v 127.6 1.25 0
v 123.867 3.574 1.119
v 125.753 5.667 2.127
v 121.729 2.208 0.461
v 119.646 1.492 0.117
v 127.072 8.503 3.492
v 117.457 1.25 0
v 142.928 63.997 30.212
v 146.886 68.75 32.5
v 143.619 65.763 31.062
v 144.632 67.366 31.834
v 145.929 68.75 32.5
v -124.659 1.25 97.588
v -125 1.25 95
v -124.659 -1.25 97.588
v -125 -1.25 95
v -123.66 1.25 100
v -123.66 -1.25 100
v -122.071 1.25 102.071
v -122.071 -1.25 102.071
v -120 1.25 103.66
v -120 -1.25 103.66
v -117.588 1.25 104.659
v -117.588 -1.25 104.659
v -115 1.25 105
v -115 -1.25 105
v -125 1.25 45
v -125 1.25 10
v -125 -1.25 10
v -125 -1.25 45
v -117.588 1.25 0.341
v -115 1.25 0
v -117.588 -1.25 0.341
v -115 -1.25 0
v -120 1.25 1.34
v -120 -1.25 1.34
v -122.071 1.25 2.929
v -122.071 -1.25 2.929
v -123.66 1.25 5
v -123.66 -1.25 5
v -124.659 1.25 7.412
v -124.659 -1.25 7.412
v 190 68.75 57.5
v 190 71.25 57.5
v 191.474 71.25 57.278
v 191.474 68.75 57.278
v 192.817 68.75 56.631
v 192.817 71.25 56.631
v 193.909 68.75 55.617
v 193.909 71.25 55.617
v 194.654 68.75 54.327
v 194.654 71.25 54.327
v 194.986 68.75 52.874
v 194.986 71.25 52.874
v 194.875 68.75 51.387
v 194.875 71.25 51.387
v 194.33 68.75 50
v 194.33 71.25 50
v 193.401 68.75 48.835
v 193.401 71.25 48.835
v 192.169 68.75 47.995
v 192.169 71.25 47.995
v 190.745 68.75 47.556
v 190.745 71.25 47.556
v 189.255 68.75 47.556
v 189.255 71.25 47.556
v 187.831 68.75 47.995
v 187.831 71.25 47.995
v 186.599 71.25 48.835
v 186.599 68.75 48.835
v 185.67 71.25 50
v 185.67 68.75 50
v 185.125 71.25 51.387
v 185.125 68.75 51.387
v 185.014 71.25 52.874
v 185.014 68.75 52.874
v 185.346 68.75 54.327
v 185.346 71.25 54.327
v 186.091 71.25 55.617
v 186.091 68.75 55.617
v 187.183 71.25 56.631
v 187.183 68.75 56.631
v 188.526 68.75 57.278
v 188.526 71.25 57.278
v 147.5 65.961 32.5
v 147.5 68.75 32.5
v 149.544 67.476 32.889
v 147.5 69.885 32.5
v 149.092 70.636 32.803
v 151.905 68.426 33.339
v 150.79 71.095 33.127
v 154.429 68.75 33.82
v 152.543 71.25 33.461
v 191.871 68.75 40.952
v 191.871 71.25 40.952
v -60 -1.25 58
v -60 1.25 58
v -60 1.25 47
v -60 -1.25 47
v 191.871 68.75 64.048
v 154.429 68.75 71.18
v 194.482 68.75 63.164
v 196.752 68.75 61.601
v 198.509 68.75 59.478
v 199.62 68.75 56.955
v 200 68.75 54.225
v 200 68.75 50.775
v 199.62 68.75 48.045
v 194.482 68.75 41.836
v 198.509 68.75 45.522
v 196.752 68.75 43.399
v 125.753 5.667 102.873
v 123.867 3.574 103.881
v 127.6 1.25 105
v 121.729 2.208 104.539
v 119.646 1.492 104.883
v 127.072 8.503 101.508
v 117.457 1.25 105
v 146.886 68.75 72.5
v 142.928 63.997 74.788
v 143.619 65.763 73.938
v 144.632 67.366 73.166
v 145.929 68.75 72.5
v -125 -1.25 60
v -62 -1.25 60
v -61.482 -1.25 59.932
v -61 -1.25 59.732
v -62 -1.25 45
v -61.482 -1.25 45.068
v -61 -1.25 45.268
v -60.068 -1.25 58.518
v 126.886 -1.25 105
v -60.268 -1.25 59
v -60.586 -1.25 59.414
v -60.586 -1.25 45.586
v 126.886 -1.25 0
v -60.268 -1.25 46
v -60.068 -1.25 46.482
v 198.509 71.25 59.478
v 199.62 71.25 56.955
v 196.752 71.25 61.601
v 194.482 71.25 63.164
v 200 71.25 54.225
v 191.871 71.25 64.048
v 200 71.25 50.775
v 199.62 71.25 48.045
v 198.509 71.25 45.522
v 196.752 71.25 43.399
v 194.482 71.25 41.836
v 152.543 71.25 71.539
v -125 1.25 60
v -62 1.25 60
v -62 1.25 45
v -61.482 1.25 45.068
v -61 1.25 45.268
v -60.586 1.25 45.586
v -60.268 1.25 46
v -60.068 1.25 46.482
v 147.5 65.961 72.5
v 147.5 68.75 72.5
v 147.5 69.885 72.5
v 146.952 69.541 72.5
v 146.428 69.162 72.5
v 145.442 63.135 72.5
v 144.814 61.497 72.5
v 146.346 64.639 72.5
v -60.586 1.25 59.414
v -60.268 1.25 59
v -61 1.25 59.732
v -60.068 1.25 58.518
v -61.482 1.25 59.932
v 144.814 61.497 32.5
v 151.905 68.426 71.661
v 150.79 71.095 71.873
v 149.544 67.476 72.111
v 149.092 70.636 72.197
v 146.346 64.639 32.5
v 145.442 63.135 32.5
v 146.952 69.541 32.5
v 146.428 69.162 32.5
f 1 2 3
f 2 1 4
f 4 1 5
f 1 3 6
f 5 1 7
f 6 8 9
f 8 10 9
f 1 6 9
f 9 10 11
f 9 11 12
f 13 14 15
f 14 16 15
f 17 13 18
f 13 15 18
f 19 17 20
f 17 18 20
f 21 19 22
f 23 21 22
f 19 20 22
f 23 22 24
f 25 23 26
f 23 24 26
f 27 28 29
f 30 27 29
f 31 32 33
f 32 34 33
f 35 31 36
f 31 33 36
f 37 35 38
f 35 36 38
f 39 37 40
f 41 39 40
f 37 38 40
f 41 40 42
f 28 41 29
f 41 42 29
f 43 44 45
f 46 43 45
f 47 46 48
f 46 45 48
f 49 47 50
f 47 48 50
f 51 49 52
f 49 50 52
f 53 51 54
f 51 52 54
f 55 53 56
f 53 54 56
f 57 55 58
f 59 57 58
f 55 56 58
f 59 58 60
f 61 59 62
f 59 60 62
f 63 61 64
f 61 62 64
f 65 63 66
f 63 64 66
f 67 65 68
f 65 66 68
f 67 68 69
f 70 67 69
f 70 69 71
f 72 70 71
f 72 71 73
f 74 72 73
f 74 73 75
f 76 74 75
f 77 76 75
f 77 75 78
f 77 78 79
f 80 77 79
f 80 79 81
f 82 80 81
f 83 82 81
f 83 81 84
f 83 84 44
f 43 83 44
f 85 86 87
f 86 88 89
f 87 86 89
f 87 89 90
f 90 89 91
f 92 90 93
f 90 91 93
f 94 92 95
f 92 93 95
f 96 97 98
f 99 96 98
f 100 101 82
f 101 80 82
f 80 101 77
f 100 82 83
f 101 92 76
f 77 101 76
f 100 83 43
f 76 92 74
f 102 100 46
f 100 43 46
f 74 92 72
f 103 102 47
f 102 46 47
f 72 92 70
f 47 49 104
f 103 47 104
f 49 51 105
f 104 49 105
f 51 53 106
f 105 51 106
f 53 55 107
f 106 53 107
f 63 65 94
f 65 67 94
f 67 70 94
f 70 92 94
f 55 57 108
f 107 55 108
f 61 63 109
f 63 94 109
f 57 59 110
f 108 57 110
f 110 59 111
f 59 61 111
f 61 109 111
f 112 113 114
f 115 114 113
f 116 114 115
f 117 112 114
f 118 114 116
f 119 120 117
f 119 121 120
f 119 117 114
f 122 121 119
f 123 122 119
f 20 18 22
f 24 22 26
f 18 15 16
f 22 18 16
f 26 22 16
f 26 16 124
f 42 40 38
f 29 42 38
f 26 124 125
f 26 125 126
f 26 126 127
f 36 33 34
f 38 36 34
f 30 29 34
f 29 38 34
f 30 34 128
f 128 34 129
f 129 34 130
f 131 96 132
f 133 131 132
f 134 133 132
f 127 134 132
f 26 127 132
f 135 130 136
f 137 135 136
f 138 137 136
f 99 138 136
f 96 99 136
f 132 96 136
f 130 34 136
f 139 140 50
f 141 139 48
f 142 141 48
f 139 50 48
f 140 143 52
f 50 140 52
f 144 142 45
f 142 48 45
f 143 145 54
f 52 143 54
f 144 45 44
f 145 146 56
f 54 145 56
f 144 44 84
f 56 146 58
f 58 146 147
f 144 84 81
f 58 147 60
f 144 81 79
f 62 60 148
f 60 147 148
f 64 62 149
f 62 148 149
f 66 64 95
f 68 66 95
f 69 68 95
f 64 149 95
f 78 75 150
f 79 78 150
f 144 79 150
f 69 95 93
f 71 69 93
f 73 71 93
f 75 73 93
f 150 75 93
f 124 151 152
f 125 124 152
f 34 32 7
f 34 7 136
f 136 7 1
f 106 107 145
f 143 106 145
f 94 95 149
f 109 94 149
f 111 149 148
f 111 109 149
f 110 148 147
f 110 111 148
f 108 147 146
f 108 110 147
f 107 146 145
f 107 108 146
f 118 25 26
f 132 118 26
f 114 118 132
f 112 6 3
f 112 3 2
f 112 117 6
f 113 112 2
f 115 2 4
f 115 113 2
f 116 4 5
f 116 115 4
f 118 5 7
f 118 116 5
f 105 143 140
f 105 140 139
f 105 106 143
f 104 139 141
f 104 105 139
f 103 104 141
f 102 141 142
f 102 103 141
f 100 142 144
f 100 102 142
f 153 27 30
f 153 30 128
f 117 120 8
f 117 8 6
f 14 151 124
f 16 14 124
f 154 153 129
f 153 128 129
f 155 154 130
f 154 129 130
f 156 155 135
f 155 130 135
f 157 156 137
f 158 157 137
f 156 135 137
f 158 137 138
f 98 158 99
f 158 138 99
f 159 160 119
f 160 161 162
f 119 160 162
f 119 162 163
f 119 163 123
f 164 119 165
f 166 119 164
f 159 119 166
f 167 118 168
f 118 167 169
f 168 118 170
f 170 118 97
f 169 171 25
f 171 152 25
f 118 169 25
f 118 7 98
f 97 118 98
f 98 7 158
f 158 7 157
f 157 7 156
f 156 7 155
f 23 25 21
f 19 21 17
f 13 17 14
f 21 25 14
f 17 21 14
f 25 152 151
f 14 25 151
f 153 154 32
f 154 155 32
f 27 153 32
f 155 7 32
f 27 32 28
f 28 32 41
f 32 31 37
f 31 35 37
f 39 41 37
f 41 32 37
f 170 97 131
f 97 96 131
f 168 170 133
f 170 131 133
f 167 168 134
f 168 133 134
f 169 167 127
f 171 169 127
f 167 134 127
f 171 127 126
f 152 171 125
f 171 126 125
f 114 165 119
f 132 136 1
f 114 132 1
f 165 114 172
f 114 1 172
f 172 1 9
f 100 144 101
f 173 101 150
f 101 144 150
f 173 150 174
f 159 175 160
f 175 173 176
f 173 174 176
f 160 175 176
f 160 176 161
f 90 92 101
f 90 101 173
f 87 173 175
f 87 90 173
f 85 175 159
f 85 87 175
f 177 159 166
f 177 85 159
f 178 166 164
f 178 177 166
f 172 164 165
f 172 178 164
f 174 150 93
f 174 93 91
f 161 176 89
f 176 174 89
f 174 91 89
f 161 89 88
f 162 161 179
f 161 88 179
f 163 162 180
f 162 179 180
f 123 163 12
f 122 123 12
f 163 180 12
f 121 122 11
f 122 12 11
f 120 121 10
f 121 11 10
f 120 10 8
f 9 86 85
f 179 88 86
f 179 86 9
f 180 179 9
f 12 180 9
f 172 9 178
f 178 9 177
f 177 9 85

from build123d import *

# Parameters (mm, degrees)
BOSS_EXTRUDE1_DEPTH = 105
CUT_EXTRUDE1_REACH  = 238.485
SKETCH2_W           = 65
SKETCH2_H           = 15
CUT_EXTRUDE12_DEPTH = 281.35970199
CUT_EXTRUDE14_REACH = 239.237
FILLET1_R           = 10
FILLET2_R           = 10
FILLET3_R           = 10
FILLET4_R           = 2
CUT_EXTRUDE15_REACH = 239.237
SKETCH13_R          = 5
FILLET5_R           = 10


with BuildPart() as part:
    # Sketch1 → Boss-Extrude1 (new body)
    with BuildSketch(Plane.XY):
        Polygon((-125, -1.25), (125, -1.25), (126.885753532, -1.25), (146.885753532, 68.75), (200, 68.75), (200, 71.25), (145, 71.25), (125, 1.25), (-125, 1.25), align=None)
    extrude(amount=BOSS_EXTRUDE1_DEPTH)

    # Sketch2 → Cut-Extrude1 (cut, up to next)
    with BuildSketch(Plane(origin=(0, 1.25, 0), x_dir=(1, 0, 0), z_dir=(0, 1, 0)), mode=Mode.PRIVATE) as cut_extrude1_sk1:
        with Locations((-92.5, -52.5)):
            Rectangle(SKETCH2_W, SKETCH2_H)
    cut_extrude1_tool1 = extrude(cut_extrude1_sk1.sketch, amount=-CUT_EXTRUDE1_REACH, mode=Mode.PRIVATE) & part.part
    add(cut_extrude1_tool1.solids().sort_by_distance((-92.5, 1.25, 52.5))[0], mode=Mode.SUBTRACT)

    # Sketch11 → Cut-Extrude12 (cut, through all)
    with BuildSketch(Plane(origin=(125, 0, 0), x_dir=(0, 0, -1), z_dir=(1, 0, 0))):
        Polygon((0, 71.25), (0, 1.25), (-32.5, 68.75), (-32.5, 71.25), align=None)
        Polygon((-72.5, 68.75), (-72.5, 71.25), (-105, 71.25), (-105, 1.25), align=None)
    extrude(amount=CUT_EXTRUDE12_DEPTH, mode=Mode.SUBTRACT)

    # Sketch12 → Cut-Extrude14 (cut, up to next)
    with BuildSketch(Plane(origin=(0, 71.25, 0), x_dir=(1, 0, 0), z_dir=(0, 1, 0)), mode=Mode.PRIVATE) as cut_extrude14_sk1:
        Polygon((200, -62.5), (147.5, -72.5), (200, -72.5), align=None)
    cut_extrude14_tool1 = extrude(cut_extrude14_sk1.sketch, amount=-CUT_EXTRUDE14_REACH, mode=Mode.PRIVATE) & part.part
    # Sketch12 → Cut-Extrude14 (cut, up to next)
    with BuildSketch(Plane(origin=(0, 71.25, 0), x_dir=(1, 0, 0), z_dir=(0, 1, 0)), mode=Mode.PRIVATE) as cut_extrude14_sk2:
        Polygon((200, -32.5), (147.5, -32.5), (200, -42.5), align=None)
    cut_extrude14_tool2 = extrude(cut_extrude14_sk2.sketch, amount=-CUT_EXTRUDE14_REACH, mode=Mode.PRIVATE) & part.part
    add(cut_extrude14_tool1.solids().sort_by_distance((182.5, 71.25, 69.166667))[0], mode=Mode.SUBTRACT)
    add(cut_extrude14_tool2.solids().sort_by_distance((182.5, 71.25, 35.833333))[0], mode=Mode.SUBTRACT)

    # Fillet1
    fillet1_edges = [part.edges().sort_by_distance(p)[0] for p in [
        (200, 70, 42.5),
        (200, 70, 62.5),
    ]]
    fillet(fillet1_edges, radius=FILLET1_R)

    # Fillet2
    # the kernel refuses this fillet: 10 mm, written as the material it adds along each edge
    with BuildSketch(Plane(origin=(146.885753532, 68.75, 32.5), x_dir=(1, 0, 0), z_dir=(0, 0, 1))) as fillet2_piece_1_section:
        with BuildLine():
            CenterArc((FILLET2_R * 0.754301412754, -FILLET2_R), FILLET2_R, 90, 74.054604099)
            Line((-FILLET2_R * 0.207222534886, -FILLET2_R * 0.725278872103), (0, 0))
            Line((0, 0), (FILLET2_R * 0.754301412754, 0))
        make_face()
    fillet2_piece_1 = extrude(amount=40, mode=Mode.PRIVATE)
    fillet2_piece_1 = split(fillet2_piece_1, bisect_by=Plane(origin=(151.701250416, 67.179105295, 33.300238174), z_dir=(-0.18711210788999527, 0, 0.9823385664224747)), keep=Keep.TOP, mode=Mode.PRIVATE)
    fillet2_piece_1 = split(fillet2_piece_1, bisect_by=Plane(origin=(151.701250416, 67.179105295, 71.699761826), z_dir=(-0.18711210788999538, 0, -0.9823385664224747)), keep=Keep.TOP, mode=Mode.PRIVATE)
    add(fillet2_piece_1)
    # the kernel refuses this fillet: 10 mm, written as the material it takes off along each edge
    with BuildSketch(Plane(origin=(145, 71.25, 13.642464681), x_dir=(-0.27472112789737757, -0.9615239476408233, 0), z_dir=(0, 0, 1))) as fillet2_2_piece_1:
        with BuildLine():
            CenterArc((FILLET2_R * 0.754301412754, FILLET2_R), FILLET2_R, 195.945395901, 74.054604099)
            Line((-FILLET2_R * 0.207222534886, FILLET2_R * 0.725278872103), (0, 0))
            Line((0, 0), (FILLET2_R * 0.754301412754, 0))
        make_face()
    extrude(amount=77.715070638, mode=Mode.SUBTRACT)

    # Fillet3
    fillet3_edges = [part.edges().sort_by_distance(p)[0] for p in [
        (125, 1.25, 52.5),
    ]]
    fillet(fillet3_edges, radius=FILLET3_R)

    # Fillet4
    fillet4_edges = [part.edges().sort_by_distance(p)[0] for p in [
        (-60, 0, 45),
        (-60, 0, 60),
    ]]
    fillet(fillet4_edges, radius=FILLET4_R)

    # Sketch13 → Cut-Extrude15 (cut, up to next)
    with BuildSketch(Plane(origin=(0, 71.25, 0), x_dir=(1, 0, 0), z_dir=(0, 1, 0)), mode=Mode.PRIVATE) as cut_extrude15_sk1:
        with Locations(Location((190, -52.5, 0), (0, 0, 270))):
            Circle(SKETCH13_R)
    cut_extrude15_tool1 = extrude(cut_extrude15_sk1.sketch, amount=-CUT_EXTRUDE15_REACH, mode=Mode.PRIVATE) & part.part
    add(cut_extrude15_tool1.solids().sort_by_distance((190, 71.25, 52.5))[0], mode=Mode.SUBTRACT)

    # Fillet5
    fillet5_edges = [part.edges().sort_by_distance(p)[0] for p in [
        (-125, 0, 0),
        (-125, 0, 105),
    ]]
    fillet(fillet5_edges, radius=FILLET5_R)


solid = part.part
